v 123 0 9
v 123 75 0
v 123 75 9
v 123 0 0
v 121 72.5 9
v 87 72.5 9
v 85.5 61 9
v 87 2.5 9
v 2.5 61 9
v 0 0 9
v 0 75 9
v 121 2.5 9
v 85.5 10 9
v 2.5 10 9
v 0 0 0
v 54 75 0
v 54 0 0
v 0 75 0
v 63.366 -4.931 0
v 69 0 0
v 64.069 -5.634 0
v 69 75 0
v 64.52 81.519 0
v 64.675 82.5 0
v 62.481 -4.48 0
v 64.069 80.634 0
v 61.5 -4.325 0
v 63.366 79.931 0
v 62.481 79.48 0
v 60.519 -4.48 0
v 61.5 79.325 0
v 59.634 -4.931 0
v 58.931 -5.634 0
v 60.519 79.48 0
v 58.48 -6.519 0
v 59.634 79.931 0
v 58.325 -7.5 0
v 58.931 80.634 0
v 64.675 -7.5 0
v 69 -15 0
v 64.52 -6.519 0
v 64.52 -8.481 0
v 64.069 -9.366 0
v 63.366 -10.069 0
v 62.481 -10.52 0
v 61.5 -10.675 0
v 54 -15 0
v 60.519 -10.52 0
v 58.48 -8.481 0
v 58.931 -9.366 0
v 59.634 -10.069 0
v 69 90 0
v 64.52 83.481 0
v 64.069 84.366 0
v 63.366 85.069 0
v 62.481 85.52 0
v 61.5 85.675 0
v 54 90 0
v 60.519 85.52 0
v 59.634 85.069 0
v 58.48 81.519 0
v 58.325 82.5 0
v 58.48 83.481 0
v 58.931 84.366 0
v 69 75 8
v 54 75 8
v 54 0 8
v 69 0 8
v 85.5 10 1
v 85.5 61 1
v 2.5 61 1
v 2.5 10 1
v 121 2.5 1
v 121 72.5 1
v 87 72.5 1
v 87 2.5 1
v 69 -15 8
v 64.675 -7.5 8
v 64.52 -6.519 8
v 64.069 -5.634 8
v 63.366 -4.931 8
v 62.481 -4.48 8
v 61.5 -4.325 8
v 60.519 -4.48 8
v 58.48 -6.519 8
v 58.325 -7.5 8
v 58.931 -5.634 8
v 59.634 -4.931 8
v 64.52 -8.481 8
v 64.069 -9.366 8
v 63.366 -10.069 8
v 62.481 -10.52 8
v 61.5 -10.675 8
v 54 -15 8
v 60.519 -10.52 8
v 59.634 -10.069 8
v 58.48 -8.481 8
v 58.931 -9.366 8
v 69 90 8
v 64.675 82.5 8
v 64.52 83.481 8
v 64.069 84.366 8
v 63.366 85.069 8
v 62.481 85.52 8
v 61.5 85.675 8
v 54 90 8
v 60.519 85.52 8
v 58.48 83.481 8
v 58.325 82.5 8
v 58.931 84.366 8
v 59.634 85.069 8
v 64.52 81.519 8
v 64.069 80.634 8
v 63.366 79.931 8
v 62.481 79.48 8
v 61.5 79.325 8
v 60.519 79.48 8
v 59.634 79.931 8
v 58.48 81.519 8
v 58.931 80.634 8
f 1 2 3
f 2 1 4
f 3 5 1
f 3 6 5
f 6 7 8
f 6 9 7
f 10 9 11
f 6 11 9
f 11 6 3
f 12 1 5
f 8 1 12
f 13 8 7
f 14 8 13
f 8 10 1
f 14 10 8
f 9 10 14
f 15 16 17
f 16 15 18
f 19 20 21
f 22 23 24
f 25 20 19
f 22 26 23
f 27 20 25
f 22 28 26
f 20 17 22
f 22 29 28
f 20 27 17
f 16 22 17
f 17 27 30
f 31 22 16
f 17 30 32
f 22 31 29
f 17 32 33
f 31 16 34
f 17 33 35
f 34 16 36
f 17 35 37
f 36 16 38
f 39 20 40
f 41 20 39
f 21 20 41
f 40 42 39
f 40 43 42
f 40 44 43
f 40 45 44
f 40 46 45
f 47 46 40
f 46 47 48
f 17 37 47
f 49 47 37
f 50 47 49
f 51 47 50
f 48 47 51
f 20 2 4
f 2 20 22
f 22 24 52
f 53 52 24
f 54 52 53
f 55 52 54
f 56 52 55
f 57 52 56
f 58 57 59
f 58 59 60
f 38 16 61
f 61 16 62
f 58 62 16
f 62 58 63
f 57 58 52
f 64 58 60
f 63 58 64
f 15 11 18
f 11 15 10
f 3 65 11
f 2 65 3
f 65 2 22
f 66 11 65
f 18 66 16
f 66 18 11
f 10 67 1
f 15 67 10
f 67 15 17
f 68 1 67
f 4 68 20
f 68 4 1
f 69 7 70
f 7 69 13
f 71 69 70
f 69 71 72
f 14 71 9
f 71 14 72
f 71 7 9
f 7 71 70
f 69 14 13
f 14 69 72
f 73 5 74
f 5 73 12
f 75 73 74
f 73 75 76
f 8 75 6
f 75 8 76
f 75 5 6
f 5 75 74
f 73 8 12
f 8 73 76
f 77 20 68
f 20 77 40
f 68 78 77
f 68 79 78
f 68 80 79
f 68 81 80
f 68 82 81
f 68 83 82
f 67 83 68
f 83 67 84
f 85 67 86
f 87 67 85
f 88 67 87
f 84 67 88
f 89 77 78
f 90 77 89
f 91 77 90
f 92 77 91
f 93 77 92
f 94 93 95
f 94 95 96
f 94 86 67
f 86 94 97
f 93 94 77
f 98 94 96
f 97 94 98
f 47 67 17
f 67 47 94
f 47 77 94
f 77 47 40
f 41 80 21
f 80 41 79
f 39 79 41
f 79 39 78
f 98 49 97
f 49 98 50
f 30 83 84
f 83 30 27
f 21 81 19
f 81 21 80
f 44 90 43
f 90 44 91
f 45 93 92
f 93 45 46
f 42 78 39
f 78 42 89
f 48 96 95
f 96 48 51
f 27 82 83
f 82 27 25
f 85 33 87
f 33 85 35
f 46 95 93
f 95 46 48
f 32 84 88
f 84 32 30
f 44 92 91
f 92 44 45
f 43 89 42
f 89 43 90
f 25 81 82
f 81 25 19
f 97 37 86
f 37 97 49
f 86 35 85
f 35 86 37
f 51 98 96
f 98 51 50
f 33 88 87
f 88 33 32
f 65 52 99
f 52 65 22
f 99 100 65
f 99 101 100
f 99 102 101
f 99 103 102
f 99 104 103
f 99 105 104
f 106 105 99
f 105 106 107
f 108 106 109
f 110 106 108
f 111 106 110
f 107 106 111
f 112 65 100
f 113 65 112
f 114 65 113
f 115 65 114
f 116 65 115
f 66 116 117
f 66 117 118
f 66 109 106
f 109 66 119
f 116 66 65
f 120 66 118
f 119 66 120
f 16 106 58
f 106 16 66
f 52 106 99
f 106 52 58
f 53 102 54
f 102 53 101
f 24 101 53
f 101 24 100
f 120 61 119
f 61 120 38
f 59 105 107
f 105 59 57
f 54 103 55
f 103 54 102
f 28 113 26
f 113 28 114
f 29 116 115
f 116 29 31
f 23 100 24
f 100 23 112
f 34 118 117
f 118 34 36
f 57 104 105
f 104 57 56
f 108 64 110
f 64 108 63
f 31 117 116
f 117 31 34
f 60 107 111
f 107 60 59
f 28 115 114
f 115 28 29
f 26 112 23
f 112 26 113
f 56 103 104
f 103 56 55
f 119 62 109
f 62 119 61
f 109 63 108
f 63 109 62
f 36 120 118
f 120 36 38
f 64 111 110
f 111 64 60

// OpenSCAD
$fn = 20;

length = 123; //actual length is ~80mm
width = 75; //actual width ~54mm
height = 9; //actual height is ~15mm


difference(){
	cube([length, width, height]);
	translate([2.5, (width-55)/2, 1])cube([83, 51, 10]);
	//translate([-1, 2.5, 2.5])cube([116, 70, 6]);
	translate([87, 2.5, 1])cube([34, width-5, 10]);
	translate([-1, width/2-7.5,15])cube([15, 15, 10]);



}
module foot(){
	
	difference(){
		cube([15,15,8]);
		translate([7.5,7.5,-0.25])cylinder(d=6.35,8.5);
		
	}
}

translate([length/2 - 7.5, -15, 0])foot();
translate([length/2-7.5, width, 0])foot();
